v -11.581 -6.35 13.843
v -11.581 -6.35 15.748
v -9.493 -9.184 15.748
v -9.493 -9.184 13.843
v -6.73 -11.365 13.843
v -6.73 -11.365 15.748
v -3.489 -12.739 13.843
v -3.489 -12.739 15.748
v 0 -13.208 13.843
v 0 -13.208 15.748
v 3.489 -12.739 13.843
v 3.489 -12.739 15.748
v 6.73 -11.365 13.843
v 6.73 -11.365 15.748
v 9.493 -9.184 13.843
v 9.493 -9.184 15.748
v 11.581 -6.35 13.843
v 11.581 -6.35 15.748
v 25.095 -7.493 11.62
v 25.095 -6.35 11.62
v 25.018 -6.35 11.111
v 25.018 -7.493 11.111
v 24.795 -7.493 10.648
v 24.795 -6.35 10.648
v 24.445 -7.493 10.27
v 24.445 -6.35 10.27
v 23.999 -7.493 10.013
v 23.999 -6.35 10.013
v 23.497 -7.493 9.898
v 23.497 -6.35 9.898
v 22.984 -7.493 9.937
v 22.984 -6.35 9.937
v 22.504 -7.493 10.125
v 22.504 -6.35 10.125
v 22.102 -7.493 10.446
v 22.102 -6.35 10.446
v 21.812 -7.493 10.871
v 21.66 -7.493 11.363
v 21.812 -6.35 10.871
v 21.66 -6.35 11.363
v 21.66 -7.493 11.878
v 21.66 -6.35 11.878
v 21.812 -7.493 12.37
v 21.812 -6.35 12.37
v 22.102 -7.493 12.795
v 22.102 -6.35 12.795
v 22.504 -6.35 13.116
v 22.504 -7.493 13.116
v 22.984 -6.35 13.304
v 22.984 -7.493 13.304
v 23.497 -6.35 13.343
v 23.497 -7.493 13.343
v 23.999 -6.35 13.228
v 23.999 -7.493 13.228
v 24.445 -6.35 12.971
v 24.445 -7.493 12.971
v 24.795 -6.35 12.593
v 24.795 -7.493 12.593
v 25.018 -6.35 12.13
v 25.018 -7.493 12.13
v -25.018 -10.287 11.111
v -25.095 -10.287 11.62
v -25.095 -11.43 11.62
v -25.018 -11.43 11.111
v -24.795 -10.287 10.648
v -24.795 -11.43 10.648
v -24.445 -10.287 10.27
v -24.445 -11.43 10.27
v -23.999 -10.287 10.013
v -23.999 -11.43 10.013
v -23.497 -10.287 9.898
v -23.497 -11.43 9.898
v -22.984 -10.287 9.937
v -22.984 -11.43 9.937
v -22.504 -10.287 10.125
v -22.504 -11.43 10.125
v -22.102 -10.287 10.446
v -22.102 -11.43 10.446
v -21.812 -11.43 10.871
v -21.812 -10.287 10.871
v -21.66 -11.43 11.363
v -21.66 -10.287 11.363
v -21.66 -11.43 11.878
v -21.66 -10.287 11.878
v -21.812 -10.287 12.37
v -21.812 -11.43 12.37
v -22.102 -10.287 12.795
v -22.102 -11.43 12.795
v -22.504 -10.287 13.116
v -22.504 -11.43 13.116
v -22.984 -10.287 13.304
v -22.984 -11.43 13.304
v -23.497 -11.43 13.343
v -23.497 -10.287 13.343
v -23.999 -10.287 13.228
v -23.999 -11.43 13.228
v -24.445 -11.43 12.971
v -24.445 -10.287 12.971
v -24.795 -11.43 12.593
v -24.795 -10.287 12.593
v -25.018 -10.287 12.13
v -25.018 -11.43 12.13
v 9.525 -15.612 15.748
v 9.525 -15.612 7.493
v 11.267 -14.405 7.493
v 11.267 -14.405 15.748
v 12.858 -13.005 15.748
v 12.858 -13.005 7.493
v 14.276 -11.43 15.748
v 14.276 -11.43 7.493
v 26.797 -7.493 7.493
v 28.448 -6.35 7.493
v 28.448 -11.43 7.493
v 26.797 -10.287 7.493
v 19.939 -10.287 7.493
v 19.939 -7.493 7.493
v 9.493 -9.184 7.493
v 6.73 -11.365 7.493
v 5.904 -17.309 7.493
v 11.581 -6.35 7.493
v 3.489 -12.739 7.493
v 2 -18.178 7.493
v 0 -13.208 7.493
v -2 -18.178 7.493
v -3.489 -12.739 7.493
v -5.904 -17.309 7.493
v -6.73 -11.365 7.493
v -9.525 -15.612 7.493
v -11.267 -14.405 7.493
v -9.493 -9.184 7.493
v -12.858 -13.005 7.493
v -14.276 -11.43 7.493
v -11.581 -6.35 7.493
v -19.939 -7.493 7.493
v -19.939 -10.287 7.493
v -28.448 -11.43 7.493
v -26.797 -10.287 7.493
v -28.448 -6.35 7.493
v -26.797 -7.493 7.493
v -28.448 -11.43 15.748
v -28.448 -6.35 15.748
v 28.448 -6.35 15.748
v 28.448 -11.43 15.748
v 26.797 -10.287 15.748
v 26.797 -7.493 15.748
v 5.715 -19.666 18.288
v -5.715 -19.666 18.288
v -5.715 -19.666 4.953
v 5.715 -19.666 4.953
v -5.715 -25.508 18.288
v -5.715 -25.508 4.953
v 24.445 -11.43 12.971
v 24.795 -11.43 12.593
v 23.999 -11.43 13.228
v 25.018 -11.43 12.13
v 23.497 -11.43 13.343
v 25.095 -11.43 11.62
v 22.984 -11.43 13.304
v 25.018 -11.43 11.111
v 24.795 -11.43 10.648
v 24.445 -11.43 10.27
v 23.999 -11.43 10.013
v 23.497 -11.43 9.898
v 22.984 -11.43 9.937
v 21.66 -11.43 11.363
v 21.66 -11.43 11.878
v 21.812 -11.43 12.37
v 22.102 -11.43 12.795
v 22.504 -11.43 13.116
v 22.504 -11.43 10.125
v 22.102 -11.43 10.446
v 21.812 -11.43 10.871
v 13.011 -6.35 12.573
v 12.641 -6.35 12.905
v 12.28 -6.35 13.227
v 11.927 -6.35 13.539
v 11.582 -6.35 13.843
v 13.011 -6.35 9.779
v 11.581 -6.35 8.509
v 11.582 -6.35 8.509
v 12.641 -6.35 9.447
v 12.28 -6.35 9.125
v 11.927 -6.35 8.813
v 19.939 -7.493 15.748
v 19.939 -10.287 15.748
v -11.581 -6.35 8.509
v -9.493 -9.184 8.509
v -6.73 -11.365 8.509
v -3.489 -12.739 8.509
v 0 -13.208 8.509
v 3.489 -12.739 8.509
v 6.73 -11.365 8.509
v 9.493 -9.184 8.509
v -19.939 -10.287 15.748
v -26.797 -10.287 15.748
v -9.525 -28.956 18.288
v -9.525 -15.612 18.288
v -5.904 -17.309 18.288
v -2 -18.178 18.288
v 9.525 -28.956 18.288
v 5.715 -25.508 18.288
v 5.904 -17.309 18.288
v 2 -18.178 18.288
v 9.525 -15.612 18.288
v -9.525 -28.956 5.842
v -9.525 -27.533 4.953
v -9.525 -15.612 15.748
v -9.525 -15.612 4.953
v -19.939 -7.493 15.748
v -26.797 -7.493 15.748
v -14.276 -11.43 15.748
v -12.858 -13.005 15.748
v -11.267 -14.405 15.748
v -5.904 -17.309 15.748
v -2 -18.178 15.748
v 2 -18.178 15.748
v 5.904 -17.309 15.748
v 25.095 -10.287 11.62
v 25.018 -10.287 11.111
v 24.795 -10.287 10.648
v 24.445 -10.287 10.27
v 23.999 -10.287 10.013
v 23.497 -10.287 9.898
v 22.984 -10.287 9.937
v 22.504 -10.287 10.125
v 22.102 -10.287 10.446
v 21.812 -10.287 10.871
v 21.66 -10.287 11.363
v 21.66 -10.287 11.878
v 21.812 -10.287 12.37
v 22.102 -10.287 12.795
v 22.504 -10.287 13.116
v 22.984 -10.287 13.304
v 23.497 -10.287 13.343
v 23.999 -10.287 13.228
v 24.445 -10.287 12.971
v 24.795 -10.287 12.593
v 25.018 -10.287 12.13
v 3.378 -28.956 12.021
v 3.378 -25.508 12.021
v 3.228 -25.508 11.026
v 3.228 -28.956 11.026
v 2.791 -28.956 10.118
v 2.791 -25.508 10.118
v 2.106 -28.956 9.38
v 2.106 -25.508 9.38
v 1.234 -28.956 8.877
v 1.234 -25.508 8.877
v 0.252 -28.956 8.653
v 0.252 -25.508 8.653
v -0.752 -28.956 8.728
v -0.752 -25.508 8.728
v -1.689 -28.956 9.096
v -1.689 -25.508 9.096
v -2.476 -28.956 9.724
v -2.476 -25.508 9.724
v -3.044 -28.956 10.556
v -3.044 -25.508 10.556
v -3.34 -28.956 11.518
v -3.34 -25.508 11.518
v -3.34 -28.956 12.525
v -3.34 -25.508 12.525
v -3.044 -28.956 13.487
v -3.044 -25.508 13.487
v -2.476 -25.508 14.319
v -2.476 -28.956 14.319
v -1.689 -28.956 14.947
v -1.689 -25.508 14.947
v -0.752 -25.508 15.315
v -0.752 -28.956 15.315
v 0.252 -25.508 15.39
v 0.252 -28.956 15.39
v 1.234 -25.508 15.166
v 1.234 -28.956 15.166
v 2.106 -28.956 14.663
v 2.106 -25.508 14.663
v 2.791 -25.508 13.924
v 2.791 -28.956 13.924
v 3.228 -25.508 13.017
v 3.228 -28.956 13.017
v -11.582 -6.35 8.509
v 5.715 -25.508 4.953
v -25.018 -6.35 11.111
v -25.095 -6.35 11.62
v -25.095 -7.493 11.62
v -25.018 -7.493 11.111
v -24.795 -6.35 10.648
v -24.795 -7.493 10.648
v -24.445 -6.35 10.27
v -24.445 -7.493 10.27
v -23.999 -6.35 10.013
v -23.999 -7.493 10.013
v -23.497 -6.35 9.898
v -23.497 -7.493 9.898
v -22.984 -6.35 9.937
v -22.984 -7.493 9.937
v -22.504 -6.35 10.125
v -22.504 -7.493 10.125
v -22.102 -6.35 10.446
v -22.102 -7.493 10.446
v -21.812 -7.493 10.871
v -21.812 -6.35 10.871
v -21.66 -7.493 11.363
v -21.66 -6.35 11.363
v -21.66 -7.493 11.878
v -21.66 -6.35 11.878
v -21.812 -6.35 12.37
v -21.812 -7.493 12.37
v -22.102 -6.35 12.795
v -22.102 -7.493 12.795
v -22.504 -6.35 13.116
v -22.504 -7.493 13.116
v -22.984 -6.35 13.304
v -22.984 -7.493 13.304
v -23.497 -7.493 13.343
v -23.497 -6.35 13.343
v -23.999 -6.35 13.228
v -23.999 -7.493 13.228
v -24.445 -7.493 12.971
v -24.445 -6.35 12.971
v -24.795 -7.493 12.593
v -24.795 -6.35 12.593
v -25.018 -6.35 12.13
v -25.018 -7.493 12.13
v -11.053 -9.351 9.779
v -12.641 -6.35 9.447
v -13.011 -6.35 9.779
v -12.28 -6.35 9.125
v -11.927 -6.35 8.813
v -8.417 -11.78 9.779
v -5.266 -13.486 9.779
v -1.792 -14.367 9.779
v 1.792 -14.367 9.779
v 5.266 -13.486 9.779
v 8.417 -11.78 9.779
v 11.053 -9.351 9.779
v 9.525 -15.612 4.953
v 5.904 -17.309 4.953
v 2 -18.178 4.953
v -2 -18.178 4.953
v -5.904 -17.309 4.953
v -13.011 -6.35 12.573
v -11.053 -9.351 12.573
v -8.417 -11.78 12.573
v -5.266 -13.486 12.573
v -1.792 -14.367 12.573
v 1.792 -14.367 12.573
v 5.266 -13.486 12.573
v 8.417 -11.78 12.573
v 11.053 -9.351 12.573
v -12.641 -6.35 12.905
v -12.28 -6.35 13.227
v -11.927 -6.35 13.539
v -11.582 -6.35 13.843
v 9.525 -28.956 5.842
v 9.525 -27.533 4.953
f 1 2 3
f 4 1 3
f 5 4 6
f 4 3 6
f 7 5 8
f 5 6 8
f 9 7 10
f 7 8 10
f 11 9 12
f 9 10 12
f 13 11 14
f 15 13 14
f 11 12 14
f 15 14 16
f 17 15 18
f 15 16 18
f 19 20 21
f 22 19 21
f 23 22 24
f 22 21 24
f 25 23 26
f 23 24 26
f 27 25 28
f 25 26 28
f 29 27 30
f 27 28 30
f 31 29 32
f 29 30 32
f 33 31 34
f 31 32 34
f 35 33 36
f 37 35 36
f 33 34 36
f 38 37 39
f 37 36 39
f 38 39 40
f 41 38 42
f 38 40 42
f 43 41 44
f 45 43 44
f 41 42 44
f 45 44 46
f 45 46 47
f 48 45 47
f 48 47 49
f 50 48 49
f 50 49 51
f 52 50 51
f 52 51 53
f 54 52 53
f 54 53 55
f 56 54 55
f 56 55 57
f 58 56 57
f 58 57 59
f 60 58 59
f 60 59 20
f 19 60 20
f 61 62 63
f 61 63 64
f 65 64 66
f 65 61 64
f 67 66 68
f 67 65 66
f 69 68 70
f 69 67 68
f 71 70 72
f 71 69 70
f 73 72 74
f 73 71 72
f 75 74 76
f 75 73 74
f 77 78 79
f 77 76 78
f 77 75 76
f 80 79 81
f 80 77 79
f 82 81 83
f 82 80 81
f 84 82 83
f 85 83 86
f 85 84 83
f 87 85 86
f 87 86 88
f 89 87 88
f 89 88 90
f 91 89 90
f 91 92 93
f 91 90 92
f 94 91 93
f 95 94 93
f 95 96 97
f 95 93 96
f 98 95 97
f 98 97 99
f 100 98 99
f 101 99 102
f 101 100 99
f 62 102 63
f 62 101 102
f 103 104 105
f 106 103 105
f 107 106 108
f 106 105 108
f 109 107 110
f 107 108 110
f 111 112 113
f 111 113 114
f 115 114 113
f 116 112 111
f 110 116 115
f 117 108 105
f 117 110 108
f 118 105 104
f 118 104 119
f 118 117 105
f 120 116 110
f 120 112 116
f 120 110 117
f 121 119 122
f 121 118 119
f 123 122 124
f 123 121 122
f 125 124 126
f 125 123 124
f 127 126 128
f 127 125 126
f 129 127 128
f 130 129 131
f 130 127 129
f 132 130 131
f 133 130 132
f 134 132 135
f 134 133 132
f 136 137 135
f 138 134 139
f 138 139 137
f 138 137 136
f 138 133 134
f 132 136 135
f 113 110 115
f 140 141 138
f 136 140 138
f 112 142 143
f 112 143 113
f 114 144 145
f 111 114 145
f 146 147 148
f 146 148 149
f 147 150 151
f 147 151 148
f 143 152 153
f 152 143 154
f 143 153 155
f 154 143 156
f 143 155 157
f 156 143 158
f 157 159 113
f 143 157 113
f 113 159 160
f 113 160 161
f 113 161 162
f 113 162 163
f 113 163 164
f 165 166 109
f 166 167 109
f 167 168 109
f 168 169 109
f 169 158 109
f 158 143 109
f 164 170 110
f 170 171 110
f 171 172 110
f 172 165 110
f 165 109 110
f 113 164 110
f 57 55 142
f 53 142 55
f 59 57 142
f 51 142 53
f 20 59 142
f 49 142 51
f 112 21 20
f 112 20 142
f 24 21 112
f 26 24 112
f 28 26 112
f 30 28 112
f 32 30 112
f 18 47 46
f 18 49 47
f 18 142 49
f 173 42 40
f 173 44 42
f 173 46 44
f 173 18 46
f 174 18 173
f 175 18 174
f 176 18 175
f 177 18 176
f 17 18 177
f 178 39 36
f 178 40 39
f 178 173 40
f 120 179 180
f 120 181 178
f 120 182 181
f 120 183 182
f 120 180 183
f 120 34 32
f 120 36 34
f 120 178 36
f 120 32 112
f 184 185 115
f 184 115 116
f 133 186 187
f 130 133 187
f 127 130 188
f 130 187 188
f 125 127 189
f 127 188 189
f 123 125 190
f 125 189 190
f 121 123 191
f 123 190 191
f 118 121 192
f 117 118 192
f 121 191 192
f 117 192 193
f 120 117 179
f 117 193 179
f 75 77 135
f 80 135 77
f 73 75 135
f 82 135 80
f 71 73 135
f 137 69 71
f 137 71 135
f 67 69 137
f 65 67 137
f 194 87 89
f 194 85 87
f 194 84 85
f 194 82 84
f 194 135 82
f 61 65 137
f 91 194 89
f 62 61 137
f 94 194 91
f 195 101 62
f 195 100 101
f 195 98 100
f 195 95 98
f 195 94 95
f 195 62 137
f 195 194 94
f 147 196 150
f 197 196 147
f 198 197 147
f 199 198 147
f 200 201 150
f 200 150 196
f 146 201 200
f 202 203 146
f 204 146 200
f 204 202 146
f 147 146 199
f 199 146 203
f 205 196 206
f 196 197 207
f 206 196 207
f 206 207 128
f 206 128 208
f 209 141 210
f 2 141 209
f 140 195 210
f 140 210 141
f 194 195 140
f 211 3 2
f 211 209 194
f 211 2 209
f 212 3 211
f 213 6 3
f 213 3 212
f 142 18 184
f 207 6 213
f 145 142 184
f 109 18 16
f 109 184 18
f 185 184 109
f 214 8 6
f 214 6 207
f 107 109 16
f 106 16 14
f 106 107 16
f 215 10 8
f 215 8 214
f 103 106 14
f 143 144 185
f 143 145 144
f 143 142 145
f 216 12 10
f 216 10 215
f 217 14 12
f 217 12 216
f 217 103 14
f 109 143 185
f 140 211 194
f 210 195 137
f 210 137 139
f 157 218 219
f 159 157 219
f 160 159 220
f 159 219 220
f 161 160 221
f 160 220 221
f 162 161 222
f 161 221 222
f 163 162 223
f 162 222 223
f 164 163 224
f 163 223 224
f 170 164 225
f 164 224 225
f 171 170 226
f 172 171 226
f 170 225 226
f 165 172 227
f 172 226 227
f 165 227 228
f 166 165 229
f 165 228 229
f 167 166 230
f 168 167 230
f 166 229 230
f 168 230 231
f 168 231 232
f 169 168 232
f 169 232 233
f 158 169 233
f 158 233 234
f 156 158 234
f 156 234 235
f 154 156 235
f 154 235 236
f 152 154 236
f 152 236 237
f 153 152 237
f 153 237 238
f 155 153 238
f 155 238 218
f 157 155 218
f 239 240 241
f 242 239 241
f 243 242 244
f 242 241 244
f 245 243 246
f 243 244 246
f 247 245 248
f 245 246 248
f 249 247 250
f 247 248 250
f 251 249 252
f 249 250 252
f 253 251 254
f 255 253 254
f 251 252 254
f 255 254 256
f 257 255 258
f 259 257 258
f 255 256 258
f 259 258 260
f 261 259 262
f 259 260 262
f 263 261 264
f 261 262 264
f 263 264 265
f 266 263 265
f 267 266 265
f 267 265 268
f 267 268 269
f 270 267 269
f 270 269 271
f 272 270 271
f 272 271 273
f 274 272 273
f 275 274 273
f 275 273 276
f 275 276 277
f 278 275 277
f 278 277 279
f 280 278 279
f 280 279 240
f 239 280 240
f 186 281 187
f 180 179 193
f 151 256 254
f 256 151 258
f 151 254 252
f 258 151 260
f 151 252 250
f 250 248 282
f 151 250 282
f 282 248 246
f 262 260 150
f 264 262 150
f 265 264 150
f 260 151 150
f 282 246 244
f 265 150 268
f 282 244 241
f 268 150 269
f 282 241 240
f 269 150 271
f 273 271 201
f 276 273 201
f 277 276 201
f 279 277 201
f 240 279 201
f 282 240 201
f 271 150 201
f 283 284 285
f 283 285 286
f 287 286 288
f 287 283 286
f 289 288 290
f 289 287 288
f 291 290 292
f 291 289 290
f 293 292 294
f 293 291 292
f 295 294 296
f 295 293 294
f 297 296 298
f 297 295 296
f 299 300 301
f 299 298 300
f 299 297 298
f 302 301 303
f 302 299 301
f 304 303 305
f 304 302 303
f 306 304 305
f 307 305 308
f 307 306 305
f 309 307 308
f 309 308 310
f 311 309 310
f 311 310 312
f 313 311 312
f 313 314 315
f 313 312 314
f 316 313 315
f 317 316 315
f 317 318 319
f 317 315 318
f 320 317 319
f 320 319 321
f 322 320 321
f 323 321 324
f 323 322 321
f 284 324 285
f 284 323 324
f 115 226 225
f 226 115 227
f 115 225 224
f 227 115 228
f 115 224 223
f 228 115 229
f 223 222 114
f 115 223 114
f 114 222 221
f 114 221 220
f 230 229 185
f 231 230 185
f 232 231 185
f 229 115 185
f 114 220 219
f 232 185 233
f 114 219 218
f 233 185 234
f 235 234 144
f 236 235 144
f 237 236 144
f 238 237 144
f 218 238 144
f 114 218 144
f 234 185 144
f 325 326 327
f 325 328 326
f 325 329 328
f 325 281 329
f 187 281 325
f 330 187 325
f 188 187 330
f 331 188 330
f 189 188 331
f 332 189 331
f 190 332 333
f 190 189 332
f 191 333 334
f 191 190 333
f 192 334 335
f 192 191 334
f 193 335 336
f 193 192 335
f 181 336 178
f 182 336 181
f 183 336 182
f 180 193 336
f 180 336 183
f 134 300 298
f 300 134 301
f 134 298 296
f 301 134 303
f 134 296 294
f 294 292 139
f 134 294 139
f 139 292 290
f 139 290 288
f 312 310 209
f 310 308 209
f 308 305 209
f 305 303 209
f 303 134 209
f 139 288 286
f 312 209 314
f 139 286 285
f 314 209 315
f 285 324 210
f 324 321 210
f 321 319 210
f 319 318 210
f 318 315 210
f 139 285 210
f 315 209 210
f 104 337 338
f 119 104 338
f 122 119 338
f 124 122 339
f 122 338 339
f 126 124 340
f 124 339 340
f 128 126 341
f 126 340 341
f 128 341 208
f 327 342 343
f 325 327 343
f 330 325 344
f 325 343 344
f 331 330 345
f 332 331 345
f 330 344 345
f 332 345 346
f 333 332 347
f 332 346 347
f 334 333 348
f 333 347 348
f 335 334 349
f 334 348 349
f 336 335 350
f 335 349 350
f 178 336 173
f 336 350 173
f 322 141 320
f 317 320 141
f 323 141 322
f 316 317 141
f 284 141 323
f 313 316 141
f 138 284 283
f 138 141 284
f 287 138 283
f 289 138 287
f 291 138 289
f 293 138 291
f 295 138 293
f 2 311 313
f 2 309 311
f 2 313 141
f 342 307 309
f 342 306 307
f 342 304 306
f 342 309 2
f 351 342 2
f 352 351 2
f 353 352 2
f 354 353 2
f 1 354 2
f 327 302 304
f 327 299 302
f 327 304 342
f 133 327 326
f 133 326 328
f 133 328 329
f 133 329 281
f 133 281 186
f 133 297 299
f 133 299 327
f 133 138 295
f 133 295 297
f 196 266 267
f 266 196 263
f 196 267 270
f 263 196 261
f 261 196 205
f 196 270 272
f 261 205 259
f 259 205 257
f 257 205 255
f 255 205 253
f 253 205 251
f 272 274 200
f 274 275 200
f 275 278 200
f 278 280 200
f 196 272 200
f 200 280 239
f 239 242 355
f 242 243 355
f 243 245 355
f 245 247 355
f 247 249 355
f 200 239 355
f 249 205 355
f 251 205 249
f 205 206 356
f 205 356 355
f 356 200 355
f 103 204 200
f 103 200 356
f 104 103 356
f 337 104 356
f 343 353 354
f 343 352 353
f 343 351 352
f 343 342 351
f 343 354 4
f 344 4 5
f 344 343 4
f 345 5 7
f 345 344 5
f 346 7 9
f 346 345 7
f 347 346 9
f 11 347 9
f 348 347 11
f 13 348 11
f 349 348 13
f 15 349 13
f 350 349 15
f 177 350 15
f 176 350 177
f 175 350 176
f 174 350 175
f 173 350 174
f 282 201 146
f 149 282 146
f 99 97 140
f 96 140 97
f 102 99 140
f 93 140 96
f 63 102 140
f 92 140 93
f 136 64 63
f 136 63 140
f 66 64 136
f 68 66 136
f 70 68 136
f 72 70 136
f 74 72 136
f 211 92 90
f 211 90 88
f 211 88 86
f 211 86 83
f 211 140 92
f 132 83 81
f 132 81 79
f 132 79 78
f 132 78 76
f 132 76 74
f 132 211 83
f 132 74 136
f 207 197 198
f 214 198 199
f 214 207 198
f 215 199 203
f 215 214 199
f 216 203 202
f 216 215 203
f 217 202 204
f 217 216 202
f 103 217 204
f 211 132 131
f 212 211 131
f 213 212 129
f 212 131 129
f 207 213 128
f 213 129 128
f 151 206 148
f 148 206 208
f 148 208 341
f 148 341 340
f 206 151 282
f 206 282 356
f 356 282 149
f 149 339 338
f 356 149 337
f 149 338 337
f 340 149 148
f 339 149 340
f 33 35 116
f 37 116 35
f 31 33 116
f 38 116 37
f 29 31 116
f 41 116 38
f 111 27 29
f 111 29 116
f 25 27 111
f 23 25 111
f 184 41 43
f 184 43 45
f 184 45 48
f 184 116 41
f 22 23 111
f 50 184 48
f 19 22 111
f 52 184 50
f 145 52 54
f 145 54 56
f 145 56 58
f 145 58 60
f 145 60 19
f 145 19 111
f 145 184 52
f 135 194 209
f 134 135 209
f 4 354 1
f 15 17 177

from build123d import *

# Parameters (mm, degrees)
SKETCH1_R                   = 18.288
BOSS_EXTRUDE1_DEPTH         = 19.05
SKETCH3_R                   = 13.208
CUT_EXTRUDE1_DEPTH          = 33.121712096
SKETCH15_W                  = 19.05
SKETCH15_H                  = 17.526
BOSS_EXTRUDE3_DEPTH         = 15.24
SKETCH16_W                  = 11.43
SKETCH16_H                  = 5.842
CUT_EXTRUDE4_DEPTH          = 39.82462909
CHAMFER1_SIZE               = 8.129699408
CHAMFER1_SIZE_2             = 5.08
F_1_4_CLEARANCE_HOLE1_D     = 6.7564
F_1_4_CLEARANCE_HOLE1_DEPTH = 3.448428068
SKETCH19_R                  = 18.288
SKETCH19_R_2                = 13.208
CUT_EXTRUDE5_DEPTH          = 0.762
CUT_EXTRUDE6_START          = -2.54
SKETCH20_R                  = 18.288
CUT_EXTRUDE6_DEPTH          = 2.54
SKETCH21_R                  = 18.288
CUT_EXTRUDE7_DEPTH          = 7.493
SKETCH22_W                  = 19.05
SKETCH22_H                  = 4.191
CUT_EXTRUDE8_DEPTH          = 42.148
SKETCH24_R                  = 14.478
CUT_EXTRUDE10_DEPTH         = 5.334
SKETCH25_W                  = 8.255
SKETCH25_H                  = 5.08
BOSS_EXTRUDE4_DEPTH         = 15.24
F_4_CLEARANCE_HOLE1_D       = 3.4544
SKETCH28_W                  = 6.858
SKETCH28_H                  = 2.794
CUT_EXTRUDE11_DEPTH         = 43.003222079
MIRROR3_COPY_1_SKETCH_W     = 6.858
MIRROR3_COPY_1_SKETCH_H     = 2.794
MIRROR3_COPY_1_DEPTH        = 43.003222079
SKETCH30_W                  = 69.645379109
SKETCH30_H                  = 31.008453513
CUT_EXTRUDE13_DEPTH         = 24.638
CHAMFER2_SIZE               = 1.27


# Some blends are built 0.0001 mm under size
with BuildPart() as part:
    # Sketch1 → Boss-Extrude1 (new body)
    with BuildSketch(Plane.XY):
        with Locations(Location((0, 0, 0), (0, 0, 180))):
            Circle(SKETCH1_R)
    extrude(amount=BOSS_EXTRUDE1_DEPTH)

    # Sketch3 → Cut-Extrude1 (cut, through all)
    with BuildSketch(Plane.XY.offset(19.05)):
        Circle(SKETCH3_R)
    extrude(amount=-CUT_EXTRUDE1_DEPTH, mode=Mode.SUBTRACT)

    # Sketch15 → Boss-Extrude3 (add)
    with BuildSketch(Plane(origin=(0, -13.716, 0), x_dir=(1, 0, 0), z_dir=(0, 1, 0))):
        with Locations((0, -9.525)):
            Rectangle(SKETCH15_W, SKETCH15_H)
    extrude(amount=-BOSS_EXTRUDE3_DEPTH)

    # Sketch16 → Cut-Extrude4 (cut, through all)
    with BuildSketch(Plane.XY.offset(18.288)):
        with Locations((0, -22.586571932)):
            Rectangle(SKETCH16_W, SKETCH16_H)
    extrude(amount=-CUT_EXTRUDE4_DEPTH, mode=Mode.SUBTRACT)

    # Chamfer1
    # the kernel refuses this chamfer: 8.129699408, 5.08 mm, written as the material it takes off along each edge
    with BuildSketch(Plane(origin=(-30.543101737, -28.956, 0.762), x_dir=(0, 0.9997899140358644, -0.020497019104217945), z_dir=(1, 0, 0))) as chamfer1_piece_1:
        Polygon((CHAMFER1_SIZE * 0.999789913978, CHAMFER1_SIZE * 0.020497019103), (-CHAMFER1_SIZE_2 * 0.0204970191042, CHAMFER1_SIZE_2 * 0.999789914036), (0, 0), align=None)
    extrude(amount=61.086203475, mode=Mode.SUBTRACT)

    # 1/4 Clearance Hole1
    with Locations(Plane(origin=(0, -28.956, 0), x_dir=(-1, 0, 0), z_dir=(0, -1, 0))):
        with Locations((0, -12.021417661)):
            Hole(F_1_4_CLEARANCE_HOLE1_D / 2, depth=F_1_4_CLEARANCE_HOLE1_DEPTH)

    # Sketch19 → Cut-Extrude5 (cut)
    with BuildSketch(Plane.XY.offset(19.05)):
        with Locations(Location((0, 0, 0), (0, 0, 238.611833536))):
            Circle(SKETCH19_R)
        Circle(SKETCH19_R_2, mode=Mode.SUBTRACT)
    extrude(amount=-CUT_EXTRUDE5_DEPTH, mode=Mode.SUBTRACT)

    # Sketch20 → Cut-Extrude6 (cut)
    with BuildSketch(Plane.XY.offset(18.288).offset(CUT_EXTRUDE6_START)):
        with Locations(Location((0, 0, 0), (0, 0, 238.611833536))):
            Circle(SKETCH20_R)
    extrude(amount=CUT_EXTRUDE6_DEPTH, mode=Mode.SUBTRACT)

    # Sketch21 → Cut-Extrude7 (cut)
    with BuildSketch(Plane(origin=(0, 0, 0), x_dir=(-1, 0, 0), z_dir=(0, 0, -1))):
        Circle(SKETCH21_R)
    extrude(amount=-CUT_EXTRUDE7_DEPTH, mode=Mode.SUBTRACT)

    # Sketch22 → Cut-Extrude8 (cut, through all)
    with BuildSketch(Plane(origin=(0, -13.716, 0), x_dir=(1, 0, 0), z_dir=(0, 1, 0))):
        with Locations((0, -2.8575)):
            Rectangle(SKETCH22_W, SKETCH22_H)
    extrude(amount=-CUT_EXTRUDE8_DEPTH, mode=Mode.SUBTRACT)

    # Sketch24 → Cut-Extrude10 (cut)
    with BuildSketch(Plane.XY.offset(13.843)):
        Circle(SKETCH24_R)
    extrude(amount=-CUT_EXTRUDE10_DEPTH, mode=Mode.SUBTRACT)

    # Sketch25 → Boss-Extrude4 (add)
    with BuildSketch(Plane(origin=(13.208, 0, 0), x_dir=(0, 0, -1), z_dir=(1, 0, 0))):
        with Locations((-11.6205, 8.89)):
            Rectangle(SKETCH25_W, SKETCH25_H)
        with Locations((-11.6205, -8.89)):
            Rectangle(SKETCH25_W, SKETCH25_H)
    boss_extrude4 = extrude(amount=BOSS_EXTRUDE4_DEPTH)

    # #4 Clearance Hole1 (through all)
    with Locations(Plane(origin=(0, -11.43, 0), x_dir=(-1, 0, 0), z_dir=(0, -1, 0))):
        with Locations((-23.368, -11.6205)):
            f_4_clearance_hole1 = Hole(F_4_CLEARANCE_HOLE1_D / 2)

    # Sketch28 → Cut-Extrude11 (cut, through all)
    with BuildSketch(Plane.XY.offset(15.748)):
        with Locations((23.368, -8.89)):
            Rectangle(SKETCH28_W, SKETCH28_H)
    cut_extrude11 = extrude(amount=-CUT_EXTRUDE11_DEPTH, mode=Mode.SUBTRACT)

    # Mirror2: Cut-Extrude11 across plane
    add(cut_extrude11.mirror(Plane.ZX), mode=Mode.SUBTRACT)

    # Mirror3: Boss-Extrude4, #4 Clearance Hole1, Cut-Extrude11 across plane
    add(boss_extrude4.mirror(Plane(origin=(0, 0, 0), x_dir=(0, 0, 1), z_dir=(1, 0, 0))))
    add(f_4_clearance_hole1.mirror(Plane(origin=(0, 0, 0), x_dir=(0, 0, 1), z_dir=(1, 0, 0))), mode=Mode.SUBTRACT)
    add(cut_extrude11.mirror(Plane(origin=(0, 0, 0), x_dir=(0, 0, 1), z_dir=(1, 0, 0))), mode=Mode.SUBTRACT)

    # Mirror3 copy 1 sketch → Mirror3 copy 1 (cut, through all)
    with BuildSketch(Plane(origin=(0, 0, 15.748), x_dir=(-1, 0, 0), z_dir=(0, 0, 1))):
        with Locations((23.368, -8.89)):
            Rectangle(MIRROR3_COPY_1_SKETCH_W, MIRROR3_COPY_1_SKETCH_H)
    extrude(amount=-MIRROR3_COPY_1_DEPTH, mode=Mode.SUBTRACT)

    # Sketch30 → Cut-Extrude13 (cut)
    with BuildSketch(Plane(origin=(0, 18.288, 0), x_dir=(1, 0, 0), z_dir=(0, 1, 0))):
        with Locations((0.103127413, -15.504226757)):
            Rectangle(SKETCH30_W, SKETCH30_H)
    extrude(amount=-CUT_EXTRUDE13_DEPTH, mode=Mode.SUBTRACT)

    # Chamfer2
    chamfer2_edges = [part.edges().sort_by_distance(p)[0] for p in [
        (0, -14.478, 13.843),
        (0, -14.478, 8.509),
    ]]
    chamfer(chamfer2_edges, length=CHAMFER2_SIZE - 0.0001)  # a hair under: the kernel refuses the full size


solid = part.part
